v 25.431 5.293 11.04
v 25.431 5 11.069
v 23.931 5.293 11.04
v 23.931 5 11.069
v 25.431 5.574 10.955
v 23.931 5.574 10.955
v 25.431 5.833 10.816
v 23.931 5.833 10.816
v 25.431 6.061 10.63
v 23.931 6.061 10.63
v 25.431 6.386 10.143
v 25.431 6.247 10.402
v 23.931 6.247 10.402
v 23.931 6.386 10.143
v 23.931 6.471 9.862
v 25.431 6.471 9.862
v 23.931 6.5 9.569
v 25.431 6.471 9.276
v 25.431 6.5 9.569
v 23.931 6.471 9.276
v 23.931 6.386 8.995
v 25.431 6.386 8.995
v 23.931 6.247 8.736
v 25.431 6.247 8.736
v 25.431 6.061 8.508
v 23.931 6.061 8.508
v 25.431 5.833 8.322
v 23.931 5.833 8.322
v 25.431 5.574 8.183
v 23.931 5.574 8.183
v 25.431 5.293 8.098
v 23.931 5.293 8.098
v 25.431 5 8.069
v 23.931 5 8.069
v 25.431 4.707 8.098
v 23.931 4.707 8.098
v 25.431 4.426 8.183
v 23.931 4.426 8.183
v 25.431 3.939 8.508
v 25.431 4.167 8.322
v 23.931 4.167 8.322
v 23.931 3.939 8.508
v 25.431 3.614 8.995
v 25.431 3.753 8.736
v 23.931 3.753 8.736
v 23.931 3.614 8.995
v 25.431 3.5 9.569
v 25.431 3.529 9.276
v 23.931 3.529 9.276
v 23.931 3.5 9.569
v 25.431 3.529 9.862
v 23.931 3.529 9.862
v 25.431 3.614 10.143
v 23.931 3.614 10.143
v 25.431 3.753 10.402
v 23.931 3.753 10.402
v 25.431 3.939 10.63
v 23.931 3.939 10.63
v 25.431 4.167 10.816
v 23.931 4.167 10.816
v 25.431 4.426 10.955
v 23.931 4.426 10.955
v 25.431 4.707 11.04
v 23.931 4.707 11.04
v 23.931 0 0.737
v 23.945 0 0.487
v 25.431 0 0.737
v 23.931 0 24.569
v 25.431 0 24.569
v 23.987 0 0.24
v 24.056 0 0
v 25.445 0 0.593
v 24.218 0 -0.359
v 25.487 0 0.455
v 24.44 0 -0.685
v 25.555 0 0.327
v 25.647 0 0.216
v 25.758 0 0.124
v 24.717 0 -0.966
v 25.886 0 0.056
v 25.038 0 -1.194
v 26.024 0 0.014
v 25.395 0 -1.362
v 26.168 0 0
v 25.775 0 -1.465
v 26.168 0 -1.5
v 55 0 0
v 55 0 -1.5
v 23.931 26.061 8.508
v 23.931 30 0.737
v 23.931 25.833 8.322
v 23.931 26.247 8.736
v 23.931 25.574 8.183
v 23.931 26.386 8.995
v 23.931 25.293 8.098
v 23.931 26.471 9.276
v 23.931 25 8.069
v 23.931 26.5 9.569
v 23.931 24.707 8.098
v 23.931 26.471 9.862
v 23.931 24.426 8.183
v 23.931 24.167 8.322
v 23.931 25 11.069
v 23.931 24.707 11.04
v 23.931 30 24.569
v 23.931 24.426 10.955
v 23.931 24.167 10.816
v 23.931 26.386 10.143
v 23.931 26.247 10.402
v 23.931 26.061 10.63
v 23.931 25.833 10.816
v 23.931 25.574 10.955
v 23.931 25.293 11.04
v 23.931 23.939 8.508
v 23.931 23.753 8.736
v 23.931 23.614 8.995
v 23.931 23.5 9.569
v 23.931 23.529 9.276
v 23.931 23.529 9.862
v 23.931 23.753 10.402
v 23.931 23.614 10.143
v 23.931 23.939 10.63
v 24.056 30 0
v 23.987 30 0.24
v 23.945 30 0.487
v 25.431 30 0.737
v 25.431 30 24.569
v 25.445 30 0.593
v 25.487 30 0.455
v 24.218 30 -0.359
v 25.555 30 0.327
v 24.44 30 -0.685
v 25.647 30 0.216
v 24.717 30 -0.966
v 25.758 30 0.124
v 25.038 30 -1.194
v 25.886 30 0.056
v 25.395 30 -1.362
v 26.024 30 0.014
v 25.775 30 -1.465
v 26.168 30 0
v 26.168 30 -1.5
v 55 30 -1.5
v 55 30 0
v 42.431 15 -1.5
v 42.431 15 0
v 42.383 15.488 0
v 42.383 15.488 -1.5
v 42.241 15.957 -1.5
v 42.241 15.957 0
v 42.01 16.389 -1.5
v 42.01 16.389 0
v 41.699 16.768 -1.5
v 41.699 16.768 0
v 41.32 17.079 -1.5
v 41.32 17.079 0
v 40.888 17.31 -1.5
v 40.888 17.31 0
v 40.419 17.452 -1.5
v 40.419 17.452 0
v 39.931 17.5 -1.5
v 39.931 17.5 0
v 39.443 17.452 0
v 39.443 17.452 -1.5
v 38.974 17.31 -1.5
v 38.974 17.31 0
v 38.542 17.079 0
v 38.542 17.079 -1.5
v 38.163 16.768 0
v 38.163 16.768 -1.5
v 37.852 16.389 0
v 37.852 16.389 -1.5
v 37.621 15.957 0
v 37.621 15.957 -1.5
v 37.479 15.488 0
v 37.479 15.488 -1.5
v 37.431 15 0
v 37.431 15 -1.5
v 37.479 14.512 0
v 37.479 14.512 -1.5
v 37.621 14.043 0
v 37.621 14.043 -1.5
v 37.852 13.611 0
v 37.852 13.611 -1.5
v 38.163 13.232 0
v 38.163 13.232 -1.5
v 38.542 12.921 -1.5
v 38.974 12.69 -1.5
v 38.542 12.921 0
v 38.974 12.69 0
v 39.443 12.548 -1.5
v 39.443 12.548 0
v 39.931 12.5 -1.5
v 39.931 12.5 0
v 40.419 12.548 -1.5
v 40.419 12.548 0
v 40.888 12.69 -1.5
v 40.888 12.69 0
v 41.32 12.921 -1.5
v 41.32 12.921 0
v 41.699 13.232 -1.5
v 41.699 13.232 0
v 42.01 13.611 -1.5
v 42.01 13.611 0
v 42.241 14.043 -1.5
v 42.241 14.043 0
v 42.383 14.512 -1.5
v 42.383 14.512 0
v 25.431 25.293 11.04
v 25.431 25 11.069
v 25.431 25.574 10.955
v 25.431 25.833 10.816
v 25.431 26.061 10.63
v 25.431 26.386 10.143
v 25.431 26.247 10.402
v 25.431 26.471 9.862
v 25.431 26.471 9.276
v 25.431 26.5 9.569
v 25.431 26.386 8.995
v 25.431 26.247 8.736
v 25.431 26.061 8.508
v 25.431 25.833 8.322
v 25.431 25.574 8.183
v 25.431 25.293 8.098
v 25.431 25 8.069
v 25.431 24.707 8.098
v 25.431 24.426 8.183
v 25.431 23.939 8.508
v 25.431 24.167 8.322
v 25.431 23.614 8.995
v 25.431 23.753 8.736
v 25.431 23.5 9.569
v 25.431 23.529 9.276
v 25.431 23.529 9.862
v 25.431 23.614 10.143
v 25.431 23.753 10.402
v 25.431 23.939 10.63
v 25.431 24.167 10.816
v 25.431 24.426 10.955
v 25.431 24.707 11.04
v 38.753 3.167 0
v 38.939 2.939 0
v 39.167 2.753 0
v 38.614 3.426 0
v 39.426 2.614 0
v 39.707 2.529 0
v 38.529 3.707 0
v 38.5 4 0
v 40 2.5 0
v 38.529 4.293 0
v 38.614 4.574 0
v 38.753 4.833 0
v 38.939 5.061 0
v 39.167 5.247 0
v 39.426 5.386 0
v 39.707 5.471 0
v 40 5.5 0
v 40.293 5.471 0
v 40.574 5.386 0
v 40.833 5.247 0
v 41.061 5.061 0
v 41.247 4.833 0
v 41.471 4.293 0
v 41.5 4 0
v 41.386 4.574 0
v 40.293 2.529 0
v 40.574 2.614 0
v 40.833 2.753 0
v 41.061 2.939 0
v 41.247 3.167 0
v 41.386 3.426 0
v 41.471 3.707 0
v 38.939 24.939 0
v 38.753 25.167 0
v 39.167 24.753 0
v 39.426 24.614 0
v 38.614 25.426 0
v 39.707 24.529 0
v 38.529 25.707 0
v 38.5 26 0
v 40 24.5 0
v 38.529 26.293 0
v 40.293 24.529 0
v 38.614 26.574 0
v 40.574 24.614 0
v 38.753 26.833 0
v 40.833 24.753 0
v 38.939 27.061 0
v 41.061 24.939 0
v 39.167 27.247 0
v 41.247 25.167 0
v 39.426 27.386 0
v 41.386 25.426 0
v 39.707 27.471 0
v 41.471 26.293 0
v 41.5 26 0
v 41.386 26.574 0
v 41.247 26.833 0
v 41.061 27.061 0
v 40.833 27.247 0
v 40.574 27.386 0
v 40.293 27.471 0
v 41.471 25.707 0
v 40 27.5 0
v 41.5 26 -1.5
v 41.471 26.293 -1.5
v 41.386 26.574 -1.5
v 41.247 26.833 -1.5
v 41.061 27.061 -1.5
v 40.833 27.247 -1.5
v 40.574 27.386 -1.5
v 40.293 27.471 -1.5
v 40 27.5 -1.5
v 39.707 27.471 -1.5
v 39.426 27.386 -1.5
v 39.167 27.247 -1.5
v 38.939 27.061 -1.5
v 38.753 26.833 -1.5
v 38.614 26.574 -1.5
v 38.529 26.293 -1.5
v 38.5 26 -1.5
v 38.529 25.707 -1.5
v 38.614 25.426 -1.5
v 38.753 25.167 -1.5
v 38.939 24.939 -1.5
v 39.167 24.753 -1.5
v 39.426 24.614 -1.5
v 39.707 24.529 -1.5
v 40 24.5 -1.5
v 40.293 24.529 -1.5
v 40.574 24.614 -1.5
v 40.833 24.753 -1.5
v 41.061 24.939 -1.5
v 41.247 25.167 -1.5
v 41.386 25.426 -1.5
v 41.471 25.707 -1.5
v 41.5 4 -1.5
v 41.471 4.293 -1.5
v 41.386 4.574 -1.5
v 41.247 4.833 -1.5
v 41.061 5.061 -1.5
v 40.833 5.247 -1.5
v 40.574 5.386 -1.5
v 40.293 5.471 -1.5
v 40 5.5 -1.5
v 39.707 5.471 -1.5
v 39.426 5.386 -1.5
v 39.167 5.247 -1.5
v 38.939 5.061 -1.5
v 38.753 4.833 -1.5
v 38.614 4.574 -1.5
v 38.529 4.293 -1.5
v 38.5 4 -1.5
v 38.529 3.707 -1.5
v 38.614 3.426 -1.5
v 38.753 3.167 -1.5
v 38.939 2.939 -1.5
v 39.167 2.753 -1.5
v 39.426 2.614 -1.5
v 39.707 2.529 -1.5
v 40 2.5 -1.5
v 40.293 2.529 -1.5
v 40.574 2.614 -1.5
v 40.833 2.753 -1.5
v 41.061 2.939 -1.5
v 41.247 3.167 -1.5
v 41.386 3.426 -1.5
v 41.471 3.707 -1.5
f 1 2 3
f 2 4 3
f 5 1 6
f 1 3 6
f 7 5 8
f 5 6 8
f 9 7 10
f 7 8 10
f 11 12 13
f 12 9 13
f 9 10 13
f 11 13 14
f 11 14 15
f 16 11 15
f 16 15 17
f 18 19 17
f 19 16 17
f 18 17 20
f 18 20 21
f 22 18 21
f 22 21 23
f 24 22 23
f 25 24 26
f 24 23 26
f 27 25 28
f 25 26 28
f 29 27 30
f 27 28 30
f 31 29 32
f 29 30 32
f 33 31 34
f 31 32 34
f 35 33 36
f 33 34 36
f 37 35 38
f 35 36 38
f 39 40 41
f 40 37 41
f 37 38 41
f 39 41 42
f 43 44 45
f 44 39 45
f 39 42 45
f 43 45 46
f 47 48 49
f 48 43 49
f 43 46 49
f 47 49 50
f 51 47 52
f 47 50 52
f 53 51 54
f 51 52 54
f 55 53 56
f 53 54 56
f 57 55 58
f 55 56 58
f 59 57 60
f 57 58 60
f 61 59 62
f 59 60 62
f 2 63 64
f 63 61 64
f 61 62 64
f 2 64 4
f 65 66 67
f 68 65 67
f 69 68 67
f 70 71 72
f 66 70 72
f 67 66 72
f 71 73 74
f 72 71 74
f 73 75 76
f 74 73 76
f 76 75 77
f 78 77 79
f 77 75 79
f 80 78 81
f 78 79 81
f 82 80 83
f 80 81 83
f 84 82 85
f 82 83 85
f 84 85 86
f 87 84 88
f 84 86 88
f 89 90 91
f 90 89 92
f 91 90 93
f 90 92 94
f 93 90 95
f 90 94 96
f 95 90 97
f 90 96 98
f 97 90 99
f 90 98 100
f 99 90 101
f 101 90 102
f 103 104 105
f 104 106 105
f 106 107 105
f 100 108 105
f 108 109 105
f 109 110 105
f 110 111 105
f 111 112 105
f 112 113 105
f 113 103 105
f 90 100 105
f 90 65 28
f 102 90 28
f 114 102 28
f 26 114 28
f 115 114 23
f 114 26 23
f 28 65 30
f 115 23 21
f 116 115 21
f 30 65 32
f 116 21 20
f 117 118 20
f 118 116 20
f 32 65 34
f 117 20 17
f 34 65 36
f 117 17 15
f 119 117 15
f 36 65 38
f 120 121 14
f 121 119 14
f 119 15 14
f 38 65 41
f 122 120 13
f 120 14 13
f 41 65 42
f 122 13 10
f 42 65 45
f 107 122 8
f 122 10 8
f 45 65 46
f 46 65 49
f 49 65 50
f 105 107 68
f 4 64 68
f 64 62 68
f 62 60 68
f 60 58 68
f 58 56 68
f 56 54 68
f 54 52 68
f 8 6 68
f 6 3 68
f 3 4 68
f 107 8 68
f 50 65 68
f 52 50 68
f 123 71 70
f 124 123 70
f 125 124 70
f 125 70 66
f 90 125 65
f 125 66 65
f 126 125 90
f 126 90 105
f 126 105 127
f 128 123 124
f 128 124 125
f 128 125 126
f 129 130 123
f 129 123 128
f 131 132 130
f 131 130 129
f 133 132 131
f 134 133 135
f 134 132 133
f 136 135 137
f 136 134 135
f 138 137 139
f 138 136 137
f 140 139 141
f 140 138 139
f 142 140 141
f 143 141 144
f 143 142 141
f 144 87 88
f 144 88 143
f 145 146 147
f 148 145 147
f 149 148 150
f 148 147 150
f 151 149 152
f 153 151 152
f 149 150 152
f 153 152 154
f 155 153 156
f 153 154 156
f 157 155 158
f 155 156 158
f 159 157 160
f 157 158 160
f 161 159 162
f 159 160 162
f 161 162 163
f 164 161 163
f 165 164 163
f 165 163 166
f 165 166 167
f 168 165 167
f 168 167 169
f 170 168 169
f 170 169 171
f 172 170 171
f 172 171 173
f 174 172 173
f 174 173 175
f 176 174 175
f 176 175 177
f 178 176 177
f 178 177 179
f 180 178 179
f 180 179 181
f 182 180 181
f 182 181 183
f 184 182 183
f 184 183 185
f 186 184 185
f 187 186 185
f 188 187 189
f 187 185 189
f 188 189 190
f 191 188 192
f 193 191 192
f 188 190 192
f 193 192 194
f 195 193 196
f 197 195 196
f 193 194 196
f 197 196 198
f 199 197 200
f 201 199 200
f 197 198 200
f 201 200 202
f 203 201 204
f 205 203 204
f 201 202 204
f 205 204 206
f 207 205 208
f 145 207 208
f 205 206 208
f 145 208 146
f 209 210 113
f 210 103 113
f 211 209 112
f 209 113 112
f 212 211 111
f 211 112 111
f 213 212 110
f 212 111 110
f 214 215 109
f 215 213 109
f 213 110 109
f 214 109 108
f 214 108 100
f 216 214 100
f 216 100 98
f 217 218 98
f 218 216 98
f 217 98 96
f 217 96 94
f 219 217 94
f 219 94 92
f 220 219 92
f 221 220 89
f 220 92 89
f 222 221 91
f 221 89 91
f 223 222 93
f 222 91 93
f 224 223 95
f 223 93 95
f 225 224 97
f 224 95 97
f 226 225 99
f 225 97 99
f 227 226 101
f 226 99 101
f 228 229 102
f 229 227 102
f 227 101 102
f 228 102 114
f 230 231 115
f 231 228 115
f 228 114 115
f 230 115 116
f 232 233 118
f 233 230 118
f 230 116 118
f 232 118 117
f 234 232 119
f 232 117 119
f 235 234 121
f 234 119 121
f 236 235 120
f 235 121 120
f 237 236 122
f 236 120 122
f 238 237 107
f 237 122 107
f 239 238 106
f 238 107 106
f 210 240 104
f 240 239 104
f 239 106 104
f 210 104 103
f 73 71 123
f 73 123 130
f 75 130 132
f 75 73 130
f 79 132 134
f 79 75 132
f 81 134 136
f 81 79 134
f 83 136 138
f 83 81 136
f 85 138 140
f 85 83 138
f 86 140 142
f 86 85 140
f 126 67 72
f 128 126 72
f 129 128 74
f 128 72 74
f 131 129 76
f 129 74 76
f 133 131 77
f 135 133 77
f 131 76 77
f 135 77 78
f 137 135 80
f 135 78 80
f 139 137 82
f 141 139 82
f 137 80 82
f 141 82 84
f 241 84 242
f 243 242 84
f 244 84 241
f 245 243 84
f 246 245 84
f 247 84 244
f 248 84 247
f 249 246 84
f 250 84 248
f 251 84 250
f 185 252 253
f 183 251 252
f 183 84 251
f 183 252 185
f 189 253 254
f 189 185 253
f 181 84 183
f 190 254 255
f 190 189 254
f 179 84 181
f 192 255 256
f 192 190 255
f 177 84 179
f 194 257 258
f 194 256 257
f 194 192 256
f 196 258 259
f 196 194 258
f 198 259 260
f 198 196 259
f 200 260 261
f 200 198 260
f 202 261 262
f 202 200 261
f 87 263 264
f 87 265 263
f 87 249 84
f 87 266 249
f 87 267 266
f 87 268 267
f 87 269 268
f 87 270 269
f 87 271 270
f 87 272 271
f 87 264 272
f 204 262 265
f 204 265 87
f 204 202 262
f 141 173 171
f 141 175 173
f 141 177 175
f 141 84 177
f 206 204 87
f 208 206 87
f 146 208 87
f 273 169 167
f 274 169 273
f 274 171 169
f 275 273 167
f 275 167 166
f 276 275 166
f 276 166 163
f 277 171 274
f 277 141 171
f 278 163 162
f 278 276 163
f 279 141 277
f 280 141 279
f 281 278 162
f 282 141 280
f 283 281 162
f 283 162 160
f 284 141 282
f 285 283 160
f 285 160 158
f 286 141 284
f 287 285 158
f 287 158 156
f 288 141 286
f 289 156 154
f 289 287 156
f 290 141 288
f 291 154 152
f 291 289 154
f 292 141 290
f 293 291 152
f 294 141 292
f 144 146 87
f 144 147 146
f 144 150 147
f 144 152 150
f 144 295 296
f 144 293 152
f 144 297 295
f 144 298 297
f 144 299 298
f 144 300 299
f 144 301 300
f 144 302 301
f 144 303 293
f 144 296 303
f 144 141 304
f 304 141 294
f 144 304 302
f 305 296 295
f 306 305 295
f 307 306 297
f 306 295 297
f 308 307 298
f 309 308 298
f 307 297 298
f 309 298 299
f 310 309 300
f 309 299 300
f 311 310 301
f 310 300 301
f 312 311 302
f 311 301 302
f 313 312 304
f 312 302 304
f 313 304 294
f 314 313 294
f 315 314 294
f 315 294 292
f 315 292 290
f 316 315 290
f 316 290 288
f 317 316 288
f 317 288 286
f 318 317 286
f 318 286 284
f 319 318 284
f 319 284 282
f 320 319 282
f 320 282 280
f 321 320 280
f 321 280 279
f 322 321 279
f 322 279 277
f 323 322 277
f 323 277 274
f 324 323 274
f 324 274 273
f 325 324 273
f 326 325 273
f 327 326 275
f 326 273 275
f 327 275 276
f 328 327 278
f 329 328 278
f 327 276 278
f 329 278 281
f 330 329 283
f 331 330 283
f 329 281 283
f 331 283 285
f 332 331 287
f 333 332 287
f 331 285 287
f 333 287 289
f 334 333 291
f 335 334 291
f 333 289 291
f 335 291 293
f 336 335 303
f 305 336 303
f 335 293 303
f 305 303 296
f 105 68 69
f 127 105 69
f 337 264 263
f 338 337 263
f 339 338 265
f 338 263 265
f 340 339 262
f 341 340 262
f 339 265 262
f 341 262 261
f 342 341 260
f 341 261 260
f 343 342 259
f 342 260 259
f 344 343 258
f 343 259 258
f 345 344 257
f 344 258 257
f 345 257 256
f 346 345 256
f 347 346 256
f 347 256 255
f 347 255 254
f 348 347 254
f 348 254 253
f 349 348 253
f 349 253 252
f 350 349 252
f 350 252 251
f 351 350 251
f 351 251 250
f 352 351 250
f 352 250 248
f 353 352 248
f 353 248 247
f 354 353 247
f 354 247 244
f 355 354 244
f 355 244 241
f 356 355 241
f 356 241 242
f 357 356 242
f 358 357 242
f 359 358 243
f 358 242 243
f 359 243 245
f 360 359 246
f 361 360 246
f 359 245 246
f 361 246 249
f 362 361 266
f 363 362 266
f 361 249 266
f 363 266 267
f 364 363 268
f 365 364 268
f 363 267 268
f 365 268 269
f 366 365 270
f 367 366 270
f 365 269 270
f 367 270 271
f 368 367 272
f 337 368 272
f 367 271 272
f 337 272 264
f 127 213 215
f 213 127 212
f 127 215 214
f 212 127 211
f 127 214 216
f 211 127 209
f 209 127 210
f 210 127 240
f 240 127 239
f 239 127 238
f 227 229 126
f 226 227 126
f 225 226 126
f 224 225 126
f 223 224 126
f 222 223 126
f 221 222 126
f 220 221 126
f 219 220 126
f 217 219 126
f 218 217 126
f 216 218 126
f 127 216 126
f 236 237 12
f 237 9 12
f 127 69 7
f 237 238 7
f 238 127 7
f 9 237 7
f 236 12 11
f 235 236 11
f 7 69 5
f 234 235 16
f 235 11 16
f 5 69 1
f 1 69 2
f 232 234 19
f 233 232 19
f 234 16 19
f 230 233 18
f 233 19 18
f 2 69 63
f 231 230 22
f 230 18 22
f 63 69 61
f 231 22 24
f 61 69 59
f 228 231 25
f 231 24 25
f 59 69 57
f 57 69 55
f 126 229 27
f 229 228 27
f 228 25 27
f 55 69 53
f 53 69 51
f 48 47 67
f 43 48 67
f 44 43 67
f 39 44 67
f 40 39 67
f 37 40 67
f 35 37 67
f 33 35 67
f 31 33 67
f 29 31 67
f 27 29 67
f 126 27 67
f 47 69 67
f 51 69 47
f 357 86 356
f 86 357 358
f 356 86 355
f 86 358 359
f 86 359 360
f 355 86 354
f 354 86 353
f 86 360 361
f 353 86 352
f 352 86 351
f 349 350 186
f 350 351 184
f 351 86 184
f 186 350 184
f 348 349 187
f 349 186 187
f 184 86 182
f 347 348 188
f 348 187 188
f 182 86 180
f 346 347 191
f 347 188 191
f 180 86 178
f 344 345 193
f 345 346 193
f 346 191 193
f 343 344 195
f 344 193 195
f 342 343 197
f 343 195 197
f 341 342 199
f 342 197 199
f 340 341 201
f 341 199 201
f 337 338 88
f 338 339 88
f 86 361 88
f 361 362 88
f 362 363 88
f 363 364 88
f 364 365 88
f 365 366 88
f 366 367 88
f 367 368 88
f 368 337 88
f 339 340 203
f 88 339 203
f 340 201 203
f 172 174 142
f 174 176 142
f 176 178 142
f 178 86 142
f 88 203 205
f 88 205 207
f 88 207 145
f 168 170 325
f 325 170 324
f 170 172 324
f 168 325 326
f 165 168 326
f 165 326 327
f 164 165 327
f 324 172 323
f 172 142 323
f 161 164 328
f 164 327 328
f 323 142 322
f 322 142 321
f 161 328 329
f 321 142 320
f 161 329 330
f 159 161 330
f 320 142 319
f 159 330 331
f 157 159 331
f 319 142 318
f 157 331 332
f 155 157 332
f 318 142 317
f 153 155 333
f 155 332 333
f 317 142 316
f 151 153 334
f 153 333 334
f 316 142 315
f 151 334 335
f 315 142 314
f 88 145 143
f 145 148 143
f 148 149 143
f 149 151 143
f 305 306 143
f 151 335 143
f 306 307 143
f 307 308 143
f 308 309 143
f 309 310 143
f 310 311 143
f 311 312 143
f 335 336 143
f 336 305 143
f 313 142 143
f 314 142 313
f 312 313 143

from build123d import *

# Parameters (mm, degrees)
BASE_FLANGE1_DEPTH              = 1.5
SKETCHED_BEND1_DEPTH            = 30
SKETCHED_BEND1_2_DEPTH          = 30
F_5_0MM_PRESS_DOWEL_HOLE1_D     = 5
F_3_0MM_PRESS_DOWEL_HOLE1_D     = 3
F_3_0MM_PRESS_DOWEL_HOLE2_D     = 3
F_3_0MM_PRESS_DOWEL_HOLE3_D     = 3
F_3_0MM_PRESS_DOWEL_HOLE3_DEPTH = 6
F_3_0MM_PRESS_DOWEL_HOLE3_TIP   = 0.901290929


# Read off the part's stored shape, not the designer's step: Sketched Bend1
# Sheet-metal steps are written as plain solids
with BuildPart() as part:
    # Sketch1 → Base-Flange1 (new body)
    with BuildSketch(Plane.XY):
        Polygon((0, 0), (25, 0), (55, 0), (55, 30), (25, 30), (0, 30), align=None)
    extrude(amount=-BASE_FLANGE1_DEPTH)

    # Sketched Bend1 outline → Sketched Bend1 (cut)
    with BuildSketch(Plane(origin=(0, 0, 0), x_dir=(1, 0, 0), z_dir=(0, 1, 0))):
        with BuildLine():
            Line((0, 0), (24.055749054, 0))
            ThreePointArc((24.055749054, 0), (24.872408828, 1.086838938), (26.16757291, 1.5))
            Line((26.16757291, 1.5), (0, 1.5))
            Line((0, 1.5), (0, 0))
        make_face()
    extrude(amount=SKETCHED_BEND1_DEPTH, mode=Mode.SUBTRACT)

    # Sketched Bend1 2 outline → Sketched Bend1 2 (add)
    with BuildSketch(Plane(origin=(0, 0, 0), x_dir=(1, 0, 0), z_dir=(0, 1, 0))):
        with BuildLine():
            ThreePointArc((24.055749054, 0), (23.962387567, -0.363053267), (23.93097291, -0.7366))
            Line((23.93097291, -0.7366), (23.93097291, -24.56902709))
            Line((23.93097291, -24.56902709), (25.43097291, -24.56902709))
            Line((25.43097291, -24.56902709), (25.43097291, -0.7366))
            ThreePointArc((25.43097291, -0.7366), (25.646718055, -0.215745145), (26.16757291, 0))
            Line((26.16757291, 0), (24.055749054, 0))
        make_face()
    extrude(amount=SKETCHED_BEND1_2_DEPTH)

    # Ø5.0mm Press Dowel Hole1 (through all)
    with Locations(Plane(origin=(0, 0, -1.5), x_dir=(-1, 0, 0), z_dir=(0, 0, -1))):
        with Locations((-39.93097291, 15)):
            Hole(F_5_0MM_PRESS_DOWEL_HOLE1_D / 2)

    # Ø3.0mm Press Dowel Hole1 (through all)
    with Locations(Plane(origin=(0, 0, -1.5), x_dir=(-1, 0, 0), z_dir=(0, 0, -1))):
        with Locations((-40, 4), (-40, 26)):
            Hole(F_3_0MM_PRESS_DOWEL_HOLE1_D / 2)

    # Ø3.0mm Press Dowel Hole2 (through all)
    with Locations(Plane(origin=(25.43097291, 0, 0), x_dir=(0, 0, -1), z_dir=(1, 0, 0))):
        with Locations((-9.56902709, 5), (-9.56902709, 25)):
            Hole(F_3_0MM_PRESS_DOWEL_HOLE2_D / 2)

    # Ø3.0mm Press Dowel Hole3
    with Locations(Plane(origin=(23.93097291, -205.525513363, -308.224624397), x_dir=(0, 1, 0), z_dir=(1, 0, 0))):
        with Locations((220.525513363, 156.531359221), (102.525513363, 181.531359221), (102.525513363, 271.531359221), (89.19270005, 226.531359221), (210.525513363, 317.793651488), (230.525513363, 317.793651488), (252.525513363, 320.462332131), (232.525513363, 300.462332131), (252.525513363, 132.600386311), (232.525513363, 152.600386311), (111.286271896, 136.531359221), (91.286271896, 136.531359221), (41.525513363, 196.432813402), (13.525513363, 196.432813402), (41.525513363, 138.767959221), (13.525513363, 138.767959221), (41.525513363, 256.62990504), (13.525513363, 256.62990504), (41.525513363, 314.294759221), (13.525513363, 314.294759221)):
            Hole(F_3_0MM_PRESS_DOWEL_HOLE3_D / 2, depth=F_3_0MM_PRESS_DOWEL_HOLE3_DEPTH)
            with Locations((0, 0, -(F_3_0MM_PRESS_DOWEL_HOLE3_DEPTH + F_3_0MM_PRESS_DOWEL_HOLE3_TIP / 2))):  # 118° drill point
                Cone(0, F_3_0MM_PRESS_DOWEL_HOLE3_D / 2, F_3_0MM_PRESS_DOWEL_HOLE3_TIP, mode=Mode.SUBTRACT)


solid = part.part
